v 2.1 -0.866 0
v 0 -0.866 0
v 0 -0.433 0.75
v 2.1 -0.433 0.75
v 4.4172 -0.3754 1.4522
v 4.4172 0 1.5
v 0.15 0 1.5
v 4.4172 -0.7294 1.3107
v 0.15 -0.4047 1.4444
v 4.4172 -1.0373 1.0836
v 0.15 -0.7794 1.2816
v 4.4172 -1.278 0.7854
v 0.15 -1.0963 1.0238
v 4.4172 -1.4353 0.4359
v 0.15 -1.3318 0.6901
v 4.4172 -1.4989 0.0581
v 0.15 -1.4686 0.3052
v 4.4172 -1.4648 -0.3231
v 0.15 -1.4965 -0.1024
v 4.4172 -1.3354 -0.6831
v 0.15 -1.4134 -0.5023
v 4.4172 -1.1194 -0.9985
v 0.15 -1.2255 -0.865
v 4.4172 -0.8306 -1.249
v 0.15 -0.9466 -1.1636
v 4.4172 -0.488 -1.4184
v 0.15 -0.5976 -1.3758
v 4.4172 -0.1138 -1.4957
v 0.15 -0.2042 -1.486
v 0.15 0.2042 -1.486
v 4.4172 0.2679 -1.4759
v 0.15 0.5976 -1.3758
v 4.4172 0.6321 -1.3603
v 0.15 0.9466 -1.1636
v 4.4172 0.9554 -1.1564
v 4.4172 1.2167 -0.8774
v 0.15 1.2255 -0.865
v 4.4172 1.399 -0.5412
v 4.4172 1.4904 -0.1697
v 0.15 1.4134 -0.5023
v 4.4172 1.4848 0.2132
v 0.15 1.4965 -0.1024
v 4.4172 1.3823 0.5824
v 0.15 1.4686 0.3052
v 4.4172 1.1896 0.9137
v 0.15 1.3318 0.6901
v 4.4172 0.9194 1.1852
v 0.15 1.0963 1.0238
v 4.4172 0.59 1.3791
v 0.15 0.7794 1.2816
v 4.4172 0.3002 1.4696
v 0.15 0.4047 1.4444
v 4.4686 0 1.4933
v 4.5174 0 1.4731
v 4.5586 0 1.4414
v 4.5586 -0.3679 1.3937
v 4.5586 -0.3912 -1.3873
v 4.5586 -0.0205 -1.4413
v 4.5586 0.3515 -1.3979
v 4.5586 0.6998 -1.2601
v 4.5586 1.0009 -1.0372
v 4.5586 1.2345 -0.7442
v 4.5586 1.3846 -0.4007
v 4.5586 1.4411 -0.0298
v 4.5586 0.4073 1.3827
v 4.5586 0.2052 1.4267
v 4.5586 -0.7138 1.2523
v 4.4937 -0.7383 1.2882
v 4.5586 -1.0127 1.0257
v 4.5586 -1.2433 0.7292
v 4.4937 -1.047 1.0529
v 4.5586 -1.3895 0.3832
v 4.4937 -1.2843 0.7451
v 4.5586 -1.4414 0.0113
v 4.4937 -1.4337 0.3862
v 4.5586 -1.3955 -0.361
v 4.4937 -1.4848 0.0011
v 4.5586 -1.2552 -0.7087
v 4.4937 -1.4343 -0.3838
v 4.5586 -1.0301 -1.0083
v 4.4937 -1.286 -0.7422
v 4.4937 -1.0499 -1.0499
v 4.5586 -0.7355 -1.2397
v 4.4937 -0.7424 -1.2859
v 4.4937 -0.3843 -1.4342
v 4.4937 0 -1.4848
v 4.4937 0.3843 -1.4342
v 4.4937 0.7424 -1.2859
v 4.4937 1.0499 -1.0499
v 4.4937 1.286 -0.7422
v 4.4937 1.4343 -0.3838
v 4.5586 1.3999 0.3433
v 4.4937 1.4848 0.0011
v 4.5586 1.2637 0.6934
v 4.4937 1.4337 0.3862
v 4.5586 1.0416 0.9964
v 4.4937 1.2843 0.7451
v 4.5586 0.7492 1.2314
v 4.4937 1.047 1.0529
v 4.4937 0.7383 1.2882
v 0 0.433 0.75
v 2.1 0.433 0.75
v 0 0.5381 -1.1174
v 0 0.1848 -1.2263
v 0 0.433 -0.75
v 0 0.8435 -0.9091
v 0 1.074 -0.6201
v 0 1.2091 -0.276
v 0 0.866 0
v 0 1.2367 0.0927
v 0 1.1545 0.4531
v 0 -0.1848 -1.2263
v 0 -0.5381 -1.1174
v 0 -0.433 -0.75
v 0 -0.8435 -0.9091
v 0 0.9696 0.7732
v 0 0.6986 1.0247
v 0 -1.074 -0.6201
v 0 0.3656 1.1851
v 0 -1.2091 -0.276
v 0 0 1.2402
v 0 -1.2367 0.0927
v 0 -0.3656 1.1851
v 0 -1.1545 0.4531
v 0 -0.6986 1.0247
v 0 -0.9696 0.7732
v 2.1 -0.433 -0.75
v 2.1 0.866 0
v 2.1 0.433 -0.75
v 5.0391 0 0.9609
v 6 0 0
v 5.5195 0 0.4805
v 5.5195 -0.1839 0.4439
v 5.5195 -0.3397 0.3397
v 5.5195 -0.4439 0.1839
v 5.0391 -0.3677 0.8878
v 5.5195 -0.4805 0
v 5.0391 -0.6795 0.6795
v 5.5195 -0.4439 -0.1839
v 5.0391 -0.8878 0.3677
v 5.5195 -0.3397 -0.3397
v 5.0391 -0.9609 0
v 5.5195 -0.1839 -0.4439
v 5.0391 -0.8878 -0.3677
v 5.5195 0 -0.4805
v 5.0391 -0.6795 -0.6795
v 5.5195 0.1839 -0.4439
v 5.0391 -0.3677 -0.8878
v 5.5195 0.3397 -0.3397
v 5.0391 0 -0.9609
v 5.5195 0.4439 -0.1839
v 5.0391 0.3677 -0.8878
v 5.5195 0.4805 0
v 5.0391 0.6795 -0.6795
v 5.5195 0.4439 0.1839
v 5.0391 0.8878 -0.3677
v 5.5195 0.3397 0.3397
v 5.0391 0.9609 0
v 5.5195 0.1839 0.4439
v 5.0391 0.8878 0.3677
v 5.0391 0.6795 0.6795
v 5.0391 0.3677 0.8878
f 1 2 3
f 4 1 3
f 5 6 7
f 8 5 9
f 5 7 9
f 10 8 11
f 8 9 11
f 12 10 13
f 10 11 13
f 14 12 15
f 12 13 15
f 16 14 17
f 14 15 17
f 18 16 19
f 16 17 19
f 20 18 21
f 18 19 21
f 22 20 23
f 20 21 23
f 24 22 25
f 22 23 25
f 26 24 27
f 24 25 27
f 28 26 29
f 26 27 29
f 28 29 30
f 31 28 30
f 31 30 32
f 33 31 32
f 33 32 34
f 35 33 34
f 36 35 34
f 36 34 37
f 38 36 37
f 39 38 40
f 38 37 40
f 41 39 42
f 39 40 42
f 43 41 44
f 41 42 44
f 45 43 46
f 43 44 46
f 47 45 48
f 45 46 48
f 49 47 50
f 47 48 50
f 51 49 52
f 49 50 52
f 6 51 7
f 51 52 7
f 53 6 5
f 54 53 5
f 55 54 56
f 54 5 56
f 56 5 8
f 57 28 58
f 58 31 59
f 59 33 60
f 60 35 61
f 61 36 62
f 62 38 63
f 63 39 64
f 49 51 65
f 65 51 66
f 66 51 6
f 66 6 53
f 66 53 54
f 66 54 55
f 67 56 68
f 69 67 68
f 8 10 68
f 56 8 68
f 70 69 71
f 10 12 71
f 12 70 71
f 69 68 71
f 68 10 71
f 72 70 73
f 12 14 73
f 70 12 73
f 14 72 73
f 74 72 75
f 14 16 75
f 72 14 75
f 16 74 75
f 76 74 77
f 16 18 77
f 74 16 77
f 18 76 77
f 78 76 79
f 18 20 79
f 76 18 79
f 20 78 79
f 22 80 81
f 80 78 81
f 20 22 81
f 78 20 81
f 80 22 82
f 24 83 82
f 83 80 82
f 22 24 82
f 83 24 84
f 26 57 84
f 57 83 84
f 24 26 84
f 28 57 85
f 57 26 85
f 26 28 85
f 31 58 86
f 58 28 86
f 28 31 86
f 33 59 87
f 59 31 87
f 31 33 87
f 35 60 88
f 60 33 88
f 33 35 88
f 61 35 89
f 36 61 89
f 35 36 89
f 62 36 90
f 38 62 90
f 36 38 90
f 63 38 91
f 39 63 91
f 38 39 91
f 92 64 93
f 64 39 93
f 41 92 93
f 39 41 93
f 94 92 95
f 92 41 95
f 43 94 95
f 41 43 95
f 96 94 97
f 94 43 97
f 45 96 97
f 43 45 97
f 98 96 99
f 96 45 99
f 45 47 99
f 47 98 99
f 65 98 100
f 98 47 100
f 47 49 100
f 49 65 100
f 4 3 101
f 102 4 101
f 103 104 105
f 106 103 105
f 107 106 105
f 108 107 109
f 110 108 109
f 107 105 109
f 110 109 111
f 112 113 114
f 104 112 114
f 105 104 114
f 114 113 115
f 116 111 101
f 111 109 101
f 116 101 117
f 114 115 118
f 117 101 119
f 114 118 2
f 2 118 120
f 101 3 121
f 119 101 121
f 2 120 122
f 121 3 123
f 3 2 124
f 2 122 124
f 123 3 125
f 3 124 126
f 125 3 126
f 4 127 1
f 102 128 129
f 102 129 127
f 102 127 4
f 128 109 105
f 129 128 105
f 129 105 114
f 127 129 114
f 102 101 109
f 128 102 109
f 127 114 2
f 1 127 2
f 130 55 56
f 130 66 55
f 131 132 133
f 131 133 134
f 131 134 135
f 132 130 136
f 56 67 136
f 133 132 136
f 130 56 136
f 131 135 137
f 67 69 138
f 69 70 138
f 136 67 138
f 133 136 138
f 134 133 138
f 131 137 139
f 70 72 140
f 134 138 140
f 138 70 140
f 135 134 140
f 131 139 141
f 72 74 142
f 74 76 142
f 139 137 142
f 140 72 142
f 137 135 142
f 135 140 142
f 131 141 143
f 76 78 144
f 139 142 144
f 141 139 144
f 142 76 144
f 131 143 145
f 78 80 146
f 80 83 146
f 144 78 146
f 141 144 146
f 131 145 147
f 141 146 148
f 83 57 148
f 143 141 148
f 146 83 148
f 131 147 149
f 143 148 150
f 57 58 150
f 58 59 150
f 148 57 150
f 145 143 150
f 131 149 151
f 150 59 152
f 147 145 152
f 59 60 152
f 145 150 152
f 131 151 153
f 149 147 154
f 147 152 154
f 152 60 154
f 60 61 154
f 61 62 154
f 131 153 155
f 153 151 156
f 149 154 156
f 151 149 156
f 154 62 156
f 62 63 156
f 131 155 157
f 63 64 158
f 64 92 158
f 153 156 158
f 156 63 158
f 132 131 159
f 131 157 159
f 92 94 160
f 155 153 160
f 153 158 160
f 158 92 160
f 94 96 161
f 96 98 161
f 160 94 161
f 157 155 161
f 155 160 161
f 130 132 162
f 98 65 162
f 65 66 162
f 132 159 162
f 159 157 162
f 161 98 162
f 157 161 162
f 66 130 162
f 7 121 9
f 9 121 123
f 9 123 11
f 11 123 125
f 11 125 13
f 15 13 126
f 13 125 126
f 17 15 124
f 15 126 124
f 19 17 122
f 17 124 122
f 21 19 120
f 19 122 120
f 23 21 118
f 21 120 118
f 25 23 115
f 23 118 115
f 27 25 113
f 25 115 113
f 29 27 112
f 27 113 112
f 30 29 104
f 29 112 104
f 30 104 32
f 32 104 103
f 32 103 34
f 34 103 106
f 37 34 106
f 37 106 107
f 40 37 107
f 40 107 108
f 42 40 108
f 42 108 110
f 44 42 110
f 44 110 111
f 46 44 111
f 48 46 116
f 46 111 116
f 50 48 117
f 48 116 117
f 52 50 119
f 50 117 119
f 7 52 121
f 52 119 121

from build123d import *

# Parameters (mm, degrees)
CUT_EXTRUDE1_DEPTH = 2.1
CHAMFER1_SIZE      = 0.15
CHAMFER1_SIZE2     = 0.259807621
FILLET1_R          = 0.2


with BuildPart() as part:
    # Sketch1 → Revolve1 (revolve)
    with BuildSketch(Plane.XY, mode=Mode.PRIVATE) as revolve1_sk:
        Polygon((0, 1.5), (0, 0), (6, 0), (4.5, 1.5), align=None)
    revolve(revolve1_sk.sketch.rotate(Axis((0, 0, 0), (1, 0, 0)), 90), axis=Axis((0, 0, 0), (1, 0, 0)))

    # Sketch2 → Cut-Extrude1 (cut)
    with BuildSketch(Plane.ZY):
        Polygon((0, -0.866025404), (0.75, -0.433012702), (0.75, 0.433012702), (0, 0.866025404), (-0.75, 0.433012702), (-0.75, -0.433012702), align=None)
    extrude(amount=-CUT_EXTRUDE1_DEPTH, mode=Mode.SUBTRACT)

    # Chamfer1
    chamfer1_edges = [part.edges().sort_by_distance(p)[0] for p in [
        (0, 0, -1.5),
    ]]
    chamfer1_side = [part.faces().sort_by_distance(p)[0] for p in [
        (2.25, 0, -1.5),
    ]]
    chamfer(chamfer1_edges, length=CHAMFER1_SIZE, length2=CHAMFER1_SIZE2, reference=chamfer1_side[0])

    # Fillet1
    fillet1_edges = [part.edges().sort_by_distance(p)[0] for p in [
        (4.5, 0, -1.5),
    ]]
    fillet(fillet1_edges, radius=FILLET1_R)


solid = part.part
